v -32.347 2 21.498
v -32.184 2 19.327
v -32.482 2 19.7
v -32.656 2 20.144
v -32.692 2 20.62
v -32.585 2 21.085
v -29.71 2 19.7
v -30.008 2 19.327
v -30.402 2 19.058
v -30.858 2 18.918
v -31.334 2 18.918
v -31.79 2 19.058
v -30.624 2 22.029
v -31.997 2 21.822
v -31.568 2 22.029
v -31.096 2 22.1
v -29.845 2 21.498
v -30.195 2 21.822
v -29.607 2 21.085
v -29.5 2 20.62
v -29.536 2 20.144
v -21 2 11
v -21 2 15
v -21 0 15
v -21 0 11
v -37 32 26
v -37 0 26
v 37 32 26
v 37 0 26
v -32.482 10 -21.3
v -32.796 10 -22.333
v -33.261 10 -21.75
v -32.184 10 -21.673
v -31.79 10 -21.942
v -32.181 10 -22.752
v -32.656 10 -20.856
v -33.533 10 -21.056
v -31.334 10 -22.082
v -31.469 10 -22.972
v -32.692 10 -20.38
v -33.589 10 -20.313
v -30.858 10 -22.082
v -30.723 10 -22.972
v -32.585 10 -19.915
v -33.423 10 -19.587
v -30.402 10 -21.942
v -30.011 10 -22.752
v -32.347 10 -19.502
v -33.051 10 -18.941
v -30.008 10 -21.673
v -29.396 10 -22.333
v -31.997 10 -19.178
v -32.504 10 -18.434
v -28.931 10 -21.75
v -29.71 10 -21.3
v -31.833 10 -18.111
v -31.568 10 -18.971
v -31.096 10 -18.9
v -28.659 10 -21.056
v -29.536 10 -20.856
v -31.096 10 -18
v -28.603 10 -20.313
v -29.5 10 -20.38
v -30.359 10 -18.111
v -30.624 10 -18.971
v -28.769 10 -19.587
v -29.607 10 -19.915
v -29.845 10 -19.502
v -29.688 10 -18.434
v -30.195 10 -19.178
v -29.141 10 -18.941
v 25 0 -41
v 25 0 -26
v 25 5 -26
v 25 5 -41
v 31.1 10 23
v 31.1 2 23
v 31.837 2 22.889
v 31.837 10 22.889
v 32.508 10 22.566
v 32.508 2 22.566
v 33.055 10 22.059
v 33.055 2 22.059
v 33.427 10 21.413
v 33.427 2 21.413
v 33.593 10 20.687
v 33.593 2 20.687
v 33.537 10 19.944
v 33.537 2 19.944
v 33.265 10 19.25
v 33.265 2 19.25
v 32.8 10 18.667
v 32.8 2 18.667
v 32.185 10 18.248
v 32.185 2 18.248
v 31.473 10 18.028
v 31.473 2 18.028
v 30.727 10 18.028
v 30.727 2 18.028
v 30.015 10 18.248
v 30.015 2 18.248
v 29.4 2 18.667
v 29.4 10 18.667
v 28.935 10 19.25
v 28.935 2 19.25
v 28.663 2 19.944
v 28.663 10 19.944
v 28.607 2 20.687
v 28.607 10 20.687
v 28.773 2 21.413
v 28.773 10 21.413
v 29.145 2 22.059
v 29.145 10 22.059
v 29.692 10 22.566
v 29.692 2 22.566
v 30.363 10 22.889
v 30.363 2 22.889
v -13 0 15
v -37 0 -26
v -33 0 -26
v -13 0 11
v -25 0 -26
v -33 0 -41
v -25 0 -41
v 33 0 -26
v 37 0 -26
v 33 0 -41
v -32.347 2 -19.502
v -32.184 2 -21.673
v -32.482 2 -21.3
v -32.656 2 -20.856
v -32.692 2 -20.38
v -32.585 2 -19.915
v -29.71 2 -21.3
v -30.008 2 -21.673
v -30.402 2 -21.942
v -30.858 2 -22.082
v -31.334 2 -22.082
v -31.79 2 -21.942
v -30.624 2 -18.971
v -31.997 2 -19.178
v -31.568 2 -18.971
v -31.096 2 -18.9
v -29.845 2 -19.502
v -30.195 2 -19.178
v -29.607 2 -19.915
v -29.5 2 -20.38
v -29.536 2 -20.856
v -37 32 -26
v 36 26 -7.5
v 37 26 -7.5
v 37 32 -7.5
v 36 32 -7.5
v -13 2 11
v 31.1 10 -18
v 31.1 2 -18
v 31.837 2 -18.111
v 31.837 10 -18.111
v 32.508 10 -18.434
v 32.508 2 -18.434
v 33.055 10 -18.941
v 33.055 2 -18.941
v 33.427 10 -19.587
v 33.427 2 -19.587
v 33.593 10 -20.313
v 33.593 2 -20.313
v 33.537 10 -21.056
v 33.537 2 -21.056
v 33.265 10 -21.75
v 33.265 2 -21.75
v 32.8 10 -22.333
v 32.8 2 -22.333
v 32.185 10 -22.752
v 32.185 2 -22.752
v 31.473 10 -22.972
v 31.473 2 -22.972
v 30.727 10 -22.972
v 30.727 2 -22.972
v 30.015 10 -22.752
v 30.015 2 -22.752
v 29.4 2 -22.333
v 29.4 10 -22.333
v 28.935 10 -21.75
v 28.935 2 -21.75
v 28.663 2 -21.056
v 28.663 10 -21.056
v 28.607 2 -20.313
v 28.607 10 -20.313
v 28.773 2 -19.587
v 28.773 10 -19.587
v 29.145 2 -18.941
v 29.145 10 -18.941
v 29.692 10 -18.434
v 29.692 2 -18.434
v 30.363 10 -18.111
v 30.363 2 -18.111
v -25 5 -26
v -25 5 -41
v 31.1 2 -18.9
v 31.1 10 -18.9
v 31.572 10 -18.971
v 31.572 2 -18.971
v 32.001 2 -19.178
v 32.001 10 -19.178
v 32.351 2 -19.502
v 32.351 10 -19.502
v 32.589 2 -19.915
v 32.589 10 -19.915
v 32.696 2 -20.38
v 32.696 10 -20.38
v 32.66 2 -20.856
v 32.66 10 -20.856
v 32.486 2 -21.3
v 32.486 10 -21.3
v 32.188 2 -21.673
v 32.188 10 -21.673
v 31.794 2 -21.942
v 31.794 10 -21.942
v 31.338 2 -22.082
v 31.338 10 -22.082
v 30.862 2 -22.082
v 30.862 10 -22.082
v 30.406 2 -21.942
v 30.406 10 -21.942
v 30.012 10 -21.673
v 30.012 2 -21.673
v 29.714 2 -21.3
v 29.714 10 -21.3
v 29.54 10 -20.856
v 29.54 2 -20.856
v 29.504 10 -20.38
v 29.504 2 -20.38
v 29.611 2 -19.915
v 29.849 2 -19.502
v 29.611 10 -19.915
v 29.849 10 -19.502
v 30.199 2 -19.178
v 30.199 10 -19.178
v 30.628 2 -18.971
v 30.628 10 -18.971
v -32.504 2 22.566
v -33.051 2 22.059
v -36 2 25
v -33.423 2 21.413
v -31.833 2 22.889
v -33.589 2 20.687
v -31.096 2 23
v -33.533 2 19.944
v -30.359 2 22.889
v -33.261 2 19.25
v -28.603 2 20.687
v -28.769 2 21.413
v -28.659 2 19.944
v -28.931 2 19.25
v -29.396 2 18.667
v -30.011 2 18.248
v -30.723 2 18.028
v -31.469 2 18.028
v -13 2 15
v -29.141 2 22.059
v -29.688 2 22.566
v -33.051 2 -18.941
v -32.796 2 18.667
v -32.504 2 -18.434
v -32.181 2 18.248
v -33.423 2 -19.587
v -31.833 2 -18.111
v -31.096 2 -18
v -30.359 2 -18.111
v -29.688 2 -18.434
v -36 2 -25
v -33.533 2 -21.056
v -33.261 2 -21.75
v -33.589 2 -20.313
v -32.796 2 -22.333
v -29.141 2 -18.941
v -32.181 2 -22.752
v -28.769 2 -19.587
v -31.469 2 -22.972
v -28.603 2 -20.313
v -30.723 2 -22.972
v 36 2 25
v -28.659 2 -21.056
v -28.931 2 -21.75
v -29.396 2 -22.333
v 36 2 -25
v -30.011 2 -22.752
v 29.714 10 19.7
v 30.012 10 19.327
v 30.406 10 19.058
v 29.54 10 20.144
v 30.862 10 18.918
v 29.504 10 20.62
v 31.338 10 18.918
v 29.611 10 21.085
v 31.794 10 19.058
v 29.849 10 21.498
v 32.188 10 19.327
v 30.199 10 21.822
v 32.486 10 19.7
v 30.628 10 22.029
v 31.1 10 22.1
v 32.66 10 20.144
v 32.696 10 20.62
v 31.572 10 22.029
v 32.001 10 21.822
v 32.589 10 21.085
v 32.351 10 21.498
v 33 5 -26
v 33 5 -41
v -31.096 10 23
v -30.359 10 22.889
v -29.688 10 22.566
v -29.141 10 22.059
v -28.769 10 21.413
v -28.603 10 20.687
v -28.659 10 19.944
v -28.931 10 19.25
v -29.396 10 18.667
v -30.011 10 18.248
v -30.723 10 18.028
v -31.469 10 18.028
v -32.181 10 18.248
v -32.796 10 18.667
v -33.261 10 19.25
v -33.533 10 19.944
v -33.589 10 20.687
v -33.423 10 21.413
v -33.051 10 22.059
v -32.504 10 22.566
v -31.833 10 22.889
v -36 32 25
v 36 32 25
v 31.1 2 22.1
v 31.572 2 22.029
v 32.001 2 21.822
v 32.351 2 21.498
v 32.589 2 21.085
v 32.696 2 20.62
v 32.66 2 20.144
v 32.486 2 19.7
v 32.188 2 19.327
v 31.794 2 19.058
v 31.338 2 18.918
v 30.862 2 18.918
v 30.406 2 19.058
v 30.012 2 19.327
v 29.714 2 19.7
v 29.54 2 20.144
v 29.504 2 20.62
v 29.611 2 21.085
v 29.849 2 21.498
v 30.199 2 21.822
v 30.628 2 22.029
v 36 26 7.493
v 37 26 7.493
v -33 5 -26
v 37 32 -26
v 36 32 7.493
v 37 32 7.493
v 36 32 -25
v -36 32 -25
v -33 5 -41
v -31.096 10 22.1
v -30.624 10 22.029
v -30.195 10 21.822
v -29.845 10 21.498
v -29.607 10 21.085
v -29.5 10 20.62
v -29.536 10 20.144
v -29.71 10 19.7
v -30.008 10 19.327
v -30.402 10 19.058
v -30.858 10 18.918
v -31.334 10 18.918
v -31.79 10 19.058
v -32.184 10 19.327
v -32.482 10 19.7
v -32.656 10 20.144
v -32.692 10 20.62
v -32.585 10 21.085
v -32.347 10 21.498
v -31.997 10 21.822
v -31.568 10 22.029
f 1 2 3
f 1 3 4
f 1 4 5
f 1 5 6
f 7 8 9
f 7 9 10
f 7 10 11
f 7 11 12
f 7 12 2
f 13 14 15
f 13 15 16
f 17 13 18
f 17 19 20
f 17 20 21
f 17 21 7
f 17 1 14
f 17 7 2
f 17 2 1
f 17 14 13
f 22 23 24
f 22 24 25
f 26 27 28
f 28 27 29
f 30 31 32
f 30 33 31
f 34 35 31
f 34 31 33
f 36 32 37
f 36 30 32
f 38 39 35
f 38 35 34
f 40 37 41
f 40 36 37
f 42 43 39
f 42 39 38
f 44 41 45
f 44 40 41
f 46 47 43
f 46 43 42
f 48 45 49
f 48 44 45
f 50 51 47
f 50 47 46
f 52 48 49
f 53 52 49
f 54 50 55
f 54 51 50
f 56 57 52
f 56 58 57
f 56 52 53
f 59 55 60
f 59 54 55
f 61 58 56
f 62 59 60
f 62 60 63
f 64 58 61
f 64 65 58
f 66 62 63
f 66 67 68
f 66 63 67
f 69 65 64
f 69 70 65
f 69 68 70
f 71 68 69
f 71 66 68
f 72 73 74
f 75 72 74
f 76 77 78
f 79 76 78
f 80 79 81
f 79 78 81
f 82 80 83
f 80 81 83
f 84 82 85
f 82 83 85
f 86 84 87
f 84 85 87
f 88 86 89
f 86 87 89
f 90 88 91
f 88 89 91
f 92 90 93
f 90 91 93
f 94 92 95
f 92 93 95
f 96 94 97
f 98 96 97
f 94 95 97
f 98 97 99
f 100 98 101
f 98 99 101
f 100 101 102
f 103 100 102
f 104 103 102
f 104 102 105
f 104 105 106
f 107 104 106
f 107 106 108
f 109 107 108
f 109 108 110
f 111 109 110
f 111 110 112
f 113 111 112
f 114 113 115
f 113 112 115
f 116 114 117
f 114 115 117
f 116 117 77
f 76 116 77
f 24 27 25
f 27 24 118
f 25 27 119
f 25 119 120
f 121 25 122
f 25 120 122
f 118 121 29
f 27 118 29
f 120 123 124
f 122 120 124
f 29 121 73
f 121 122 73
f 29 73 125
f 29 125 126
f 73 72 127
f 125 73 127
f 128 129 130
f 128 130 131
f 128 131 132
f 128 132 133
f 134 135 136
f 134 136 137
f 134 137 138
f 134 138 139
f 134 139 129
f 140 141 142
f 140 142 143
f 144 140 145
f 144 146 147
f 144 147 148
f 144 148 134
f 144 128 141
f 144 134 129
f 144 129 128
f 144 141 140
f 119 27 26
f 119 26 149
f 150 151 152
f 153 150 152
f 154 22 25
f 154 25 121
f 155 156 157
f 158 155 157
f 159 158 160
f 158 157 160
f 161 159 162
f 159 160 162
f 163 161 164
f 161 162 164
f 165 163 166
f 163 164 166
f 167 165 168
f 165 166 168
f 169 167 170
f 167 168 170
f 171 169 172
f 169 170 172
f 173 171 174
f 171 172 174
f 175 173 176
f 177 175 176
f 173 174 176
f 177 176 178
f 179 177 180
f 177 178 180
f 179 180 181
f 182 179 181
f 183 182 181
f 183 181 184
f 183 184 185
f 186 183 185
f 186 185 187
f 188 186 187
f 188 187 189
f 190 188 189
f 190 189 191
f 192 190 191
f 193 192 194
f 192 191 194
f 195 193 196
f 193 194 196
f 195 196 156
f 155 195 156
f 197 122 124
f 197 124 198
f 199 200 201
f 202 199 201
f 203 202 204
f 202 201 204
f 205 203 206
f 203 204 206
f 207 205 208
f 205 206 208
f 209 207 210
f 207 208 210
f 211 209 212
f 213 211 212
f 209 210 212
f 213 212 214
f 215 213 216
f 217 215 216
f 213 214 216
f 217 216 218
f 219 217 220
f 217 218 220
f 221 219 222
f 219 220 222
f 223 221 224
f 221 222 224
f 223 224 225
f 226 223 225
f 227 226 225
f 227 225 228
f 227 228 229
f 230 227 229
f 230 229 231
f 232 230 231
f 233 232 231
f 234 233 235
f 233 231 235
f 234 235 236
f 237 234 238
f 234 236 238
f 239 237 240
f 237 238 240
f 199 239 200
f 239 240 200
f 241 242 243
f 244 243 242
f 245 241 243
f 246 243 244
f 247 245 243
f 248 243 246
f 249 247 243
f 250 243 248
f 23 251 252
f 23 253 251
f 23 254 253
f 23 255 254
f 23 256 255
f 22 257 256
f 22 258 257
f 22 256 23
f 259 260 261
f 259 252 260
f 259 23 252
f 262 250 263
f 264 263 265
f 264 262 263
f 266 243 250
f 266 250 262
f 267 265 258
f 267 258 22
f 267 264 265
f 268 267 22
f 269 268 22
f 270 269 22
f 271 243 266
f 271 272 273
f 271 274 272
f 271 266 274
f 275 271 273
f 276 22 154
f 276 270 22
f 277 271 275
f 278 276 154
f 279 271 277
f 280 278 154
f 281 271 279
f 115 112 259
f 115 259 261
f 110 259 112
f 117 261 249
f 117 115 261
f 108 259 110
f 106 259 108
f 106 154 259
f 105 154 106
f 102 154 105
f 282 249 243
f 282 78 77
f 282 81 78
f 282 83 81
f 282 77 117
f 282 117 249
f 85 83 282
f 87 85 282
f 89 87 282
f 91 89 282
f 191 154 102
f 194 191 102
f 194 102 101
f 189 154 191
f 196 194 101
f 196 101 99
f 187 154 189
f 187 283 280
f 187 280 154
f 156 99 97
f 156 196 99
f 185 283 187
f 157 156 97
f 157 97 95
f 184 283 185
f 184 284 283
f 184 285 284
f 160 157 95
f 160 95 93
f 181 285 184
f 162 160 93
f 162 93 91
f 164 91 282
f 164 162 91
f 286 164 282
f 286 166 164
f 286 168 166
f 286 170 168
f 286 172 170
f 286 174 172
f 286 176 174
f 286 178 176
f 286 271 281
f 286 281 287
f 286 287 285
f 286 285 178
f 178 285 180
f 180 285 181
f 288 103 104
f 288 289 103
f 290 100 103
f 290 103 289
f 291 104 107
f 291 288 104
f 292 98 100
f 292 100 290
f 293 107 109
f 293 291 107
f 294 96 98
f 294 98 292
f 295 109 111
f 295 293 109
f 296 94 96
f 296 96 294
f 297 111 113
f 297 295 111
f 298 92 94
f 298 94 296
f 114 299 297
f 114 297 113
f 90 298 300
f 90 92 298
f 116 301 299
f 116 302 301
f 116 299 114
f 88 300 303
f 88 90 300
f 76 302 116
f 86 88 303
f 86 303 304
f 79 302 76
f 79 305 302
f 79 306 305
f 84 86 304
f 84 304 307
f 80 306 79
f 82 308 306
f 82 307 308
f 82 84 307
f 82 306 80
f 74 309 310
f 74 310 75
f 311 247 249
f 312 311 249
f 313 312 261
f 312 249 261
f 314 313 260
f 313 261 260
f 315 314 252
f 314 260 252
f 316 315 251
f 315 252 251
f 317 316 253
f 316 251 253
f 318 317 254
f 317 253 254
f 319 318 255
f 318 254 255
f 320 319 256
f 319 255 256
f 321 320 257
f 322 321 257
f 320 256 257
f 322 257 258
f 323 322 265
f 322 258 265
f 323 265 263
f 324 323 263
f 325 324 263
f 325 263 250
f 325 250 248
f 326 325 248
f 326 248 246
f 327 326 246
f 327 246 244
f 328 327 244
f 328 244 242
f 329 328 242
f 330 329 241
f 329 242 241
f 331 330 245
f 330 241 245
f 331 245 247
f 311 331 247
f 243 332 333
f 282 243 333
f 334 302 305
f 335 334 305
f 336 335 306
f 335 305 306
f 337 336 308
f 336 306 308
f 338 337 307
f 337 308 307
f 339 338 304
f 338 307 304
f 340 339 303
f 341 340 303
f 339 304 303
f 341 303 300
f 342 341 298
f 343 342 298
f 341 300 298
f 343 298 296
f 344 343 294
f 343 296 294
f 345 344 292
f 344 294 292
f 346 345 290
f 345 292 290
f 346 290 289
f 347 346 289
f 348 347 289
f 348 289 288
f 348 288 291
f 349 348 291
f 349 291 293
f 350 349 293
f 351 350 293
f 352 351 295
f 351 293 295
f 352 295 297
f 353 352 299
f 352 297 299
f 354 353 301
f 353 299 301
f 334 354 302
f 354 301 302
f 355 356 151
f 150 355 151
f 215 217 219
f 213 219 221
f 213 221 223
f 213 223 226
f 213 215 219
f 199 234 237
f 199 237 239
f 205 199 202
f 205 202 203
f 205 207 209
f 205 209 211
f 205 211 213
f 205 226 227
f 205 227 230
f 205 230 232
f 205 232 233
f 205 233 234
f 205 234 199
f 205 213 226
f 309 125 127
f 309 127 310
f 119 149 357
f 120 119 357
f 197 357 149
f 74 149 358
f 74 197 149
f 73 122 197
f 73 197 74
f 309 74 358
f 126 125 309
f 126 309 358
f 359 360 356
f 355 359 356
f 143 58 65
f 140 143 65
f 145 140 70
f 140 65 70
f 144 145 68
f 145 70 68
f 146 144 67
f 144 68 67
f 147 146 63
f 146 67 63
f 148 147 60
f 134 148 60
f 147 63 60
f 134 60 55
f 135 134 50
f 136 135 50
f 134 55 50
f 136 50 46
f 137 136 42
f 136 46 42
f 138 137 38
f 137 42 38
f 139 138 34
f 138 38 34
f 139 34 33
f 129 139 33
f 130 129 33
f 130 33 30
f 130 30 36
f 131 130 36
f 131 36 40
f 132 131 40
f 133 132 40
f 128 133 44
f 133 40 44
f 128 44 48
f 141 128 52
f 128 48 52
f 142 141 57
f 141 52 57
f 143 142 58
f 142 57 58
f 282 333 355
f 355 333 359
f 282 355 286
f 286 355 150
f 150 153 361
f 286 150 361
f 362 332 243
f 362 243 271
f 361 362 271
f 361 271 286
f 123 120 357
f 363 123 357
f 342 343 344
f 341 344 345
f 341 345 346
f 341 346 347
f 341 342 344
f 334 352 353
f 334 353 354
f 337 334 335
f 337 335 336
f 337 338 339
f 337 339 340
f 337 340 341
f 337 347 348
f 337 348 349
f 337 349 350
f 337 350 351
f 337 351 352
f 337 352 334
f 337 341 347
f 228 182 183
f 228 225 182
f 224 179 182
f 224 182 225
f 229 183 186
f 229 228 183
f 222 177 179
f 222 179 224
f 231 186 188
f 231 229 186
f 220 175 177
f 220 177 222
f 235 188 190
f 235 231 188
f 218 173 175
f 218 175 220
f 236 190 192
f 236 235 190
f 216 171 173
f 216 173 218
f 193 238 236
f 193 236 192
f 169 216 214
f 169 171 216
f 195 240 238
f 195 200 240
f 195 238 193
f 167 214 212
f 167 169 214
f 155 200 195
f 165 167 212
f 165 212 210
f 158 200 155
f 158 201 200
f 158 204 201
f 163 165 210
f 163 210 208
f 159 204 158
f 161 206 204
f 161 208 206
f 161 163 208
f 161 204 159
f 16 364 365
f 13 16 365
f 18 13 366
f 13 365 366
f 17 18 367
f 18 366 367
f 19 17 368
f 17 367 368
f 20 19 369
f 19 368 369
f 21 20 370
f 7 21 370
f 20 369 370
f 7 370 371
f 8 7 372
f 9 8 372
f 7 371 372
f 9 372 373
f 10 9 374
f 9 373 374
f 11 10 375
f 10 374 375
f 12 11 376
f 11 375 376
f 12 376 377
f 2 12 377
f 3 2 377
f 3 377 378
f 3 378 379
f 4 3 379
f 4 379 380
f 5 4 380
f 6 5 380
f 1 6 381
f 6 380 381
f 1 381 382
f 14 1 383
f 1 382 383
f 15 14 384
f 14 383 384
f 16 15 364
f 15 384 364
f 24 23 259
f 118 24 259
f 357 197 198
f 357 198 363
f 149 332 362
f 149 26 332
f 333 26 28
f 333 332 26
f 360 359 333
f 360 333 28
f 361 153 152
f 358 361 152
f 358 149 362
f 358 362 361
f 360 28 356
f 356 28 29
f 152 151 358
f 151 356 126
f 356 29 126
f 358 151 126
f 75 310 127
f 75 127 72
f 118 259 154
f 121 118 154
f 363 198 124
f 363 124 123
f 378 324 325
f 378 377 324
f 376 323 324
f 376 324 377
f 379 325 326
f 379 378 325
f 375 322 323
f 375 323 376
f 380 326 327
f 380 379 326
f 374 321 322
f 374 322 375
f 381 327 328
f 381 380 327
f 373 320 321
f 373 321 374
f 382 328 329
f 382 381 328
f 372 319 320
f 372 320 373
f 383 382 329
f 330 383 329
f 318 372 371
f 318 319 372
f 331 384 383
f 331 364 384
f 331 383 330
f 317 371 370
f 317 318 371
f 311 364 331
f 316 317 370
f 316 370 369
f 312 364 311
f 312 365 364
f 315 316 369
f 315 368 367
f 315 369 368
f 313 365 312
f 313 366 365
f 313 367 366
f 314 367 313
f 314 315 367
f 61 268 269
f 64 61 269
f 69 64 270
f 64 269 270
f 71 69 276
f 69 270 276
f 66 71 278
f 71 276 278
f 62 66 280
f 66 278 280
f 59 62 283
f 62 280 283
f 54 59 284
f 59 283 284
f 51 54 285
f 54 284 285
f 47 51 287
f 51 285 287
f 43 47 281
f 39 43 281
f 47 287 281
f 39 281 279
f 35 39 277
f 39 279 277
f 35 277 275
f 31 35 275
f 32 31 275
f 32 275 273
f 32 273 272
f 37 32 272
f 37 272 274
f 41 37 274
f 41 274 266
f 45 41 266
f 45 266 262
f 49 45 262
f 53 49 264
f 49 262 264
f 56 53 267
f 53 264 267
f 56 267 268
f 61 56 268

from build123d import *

# Parameters (mm, degrees)
ENCLOSURE_SHELL_SKETCH_W      = 74
ENCLOSURE_SHELL_SKETCH_H      = 52
ENCLOSURE_SHELL_FEATURE_DEPTH = 32
ENCLOSURE_GAP_SKETCH_W        = 72
ENCLOSURE_GAP_SKETCH_H        = 50
ENCLOSURE_GAP_FEATURE_DEPTH   = 30
SCREW_SHELL_SKETCH_R          = 2.5
SCREW_SHELL_FEATURE_DEPTH     = 8
SCREW_HOLE_SKETCH_R           = 1.6
SCREW_HOLE_FEATURE_DEPTH      = 8
BATTERY_CUT_REACH             = 86.711
BATTERY_CUT_DIRECTION_2_DEPTH = 85.711274338
CAMERA_CORD_HOLE_SKETCH_W     = 8
CAMERA_CORD_HOLE_SKETCH_H     = 4
CAMERA_CORD_HOLE_DEPTH        = 55.267854205
TAB_FEATURE_SKETCH_W          = 8
TAB_FEATURE_SKETCH_H          = 5
TAB_FEATURE_DEPTH             = 15


with BuildPart() as part:
    # Enclosure Shell Sketch → Enclosure Shell Feature (new body)
    with BuildSketch(Plane(origin=(0, 0, 0), x_dir=(1, 0, 0), z_dir=(0, 1, 0))):
        Rectangle(ENCLOSURE_SHELL_SKETCH_W, ENCLOSURE_SHELL_SKETCH_H)
    extrude(amount=ENCLOSURE_SHELL_FEATURE_DEPTH)

    # Enclosure Gap Sketch → Enclosure Gap Feature (cut)
    with BuildSketch(Plane(origin=(0, 32, 0), x_dir=(1, 0, 0), z_dir=(0, 1, 0))):
        Rectangle(ENCLOSURE_GAP_SKETCH_W, ENCLOSURE_GAP_SKETCH_H)
    extrude(amount=-ENCLOSURE_GAP_FEATURE_DEPTH, mode=Mode.SUBTRACT)

    # Screw Shell Sketch → Screw Shell Feature (add)
    with BuildSketch(Plane(origin=(0, 2, 0), x_dir=(1, 0, 0), z_dir=(0, 1, 0))):
        with Locations(Location((-31.096, 20.5, 0), (0, 0, 270))):
            Circle(SCREW_SHELL_SKETCH_R)
        with Locations(Location((-31.096, -20.5, 0), (0, 0, 270))):
            Circle(SCREW_SHELL_SKETCH_R)
        with Locations(Location((31.1, 20.5, 0), (0, 0, 270))):
            Circle(SCREW_SHELL_SKETCH_R)
        with Locations(Location((31.1, -20.5, 0), (0, 0, 270))):
            Circle(SCREW_SHELL_SKETCH_R)
    extrude(amount=SCREW_SHELL_FEATURE_DEPTH)

    # Screw Hole Sketch → Screw Hole Feature (cut)
    with BuildSketch(Plane(origin=(0, 10, 0), x_dir=(1, 0, 0), z_dir=(0, 1, 0))):
        with Locations(Location((-31.096, 20.5, 0), (0, 0, 270))):
            Circle(SCREW_HOLE_SKETCH_R)
        with Locations(Location((-31.096, -20.5, 0), (0, 0, 270))):
            Circle(SCREW_HOLE_SKETCH_R)
        with Locations(Location((31.1, -20.5, 0), (0, 0, 270))):
            Circle(SCREW_HOLE_SKETCH_R)
        with Locations(Location((31.1, 20.5, 0), (0, 0, 270))):
            Circle(SCREW_HOLE_SKETCH_R)
    extrude(amount=-SCREW_HOLE_FEATURE_DEPTH, mode=Mode.SUBTRACT)

    # Battery Cut Sketch → Battery Cut (cut, up to next)
    with BuildSketch(Plane.ZY.offset(-37), mode=Mode.PRIVATE) as battery_cut_sk1:
        Polygon((0, 32), (7.492527579, 32), (7.492527579, 26), (-7.5, 26), (-7.5, 32), align=None)
    battery_cut_tool1 = extrude(battery_cut_sk1.sketch, amount=BATTERY_CUT_REACH, mode=Mode.PRIVATE) & part.part
    add(battery_cut_tool1.solids().sort_by_distance((37, 29, -0.003736))[0], mode=Mode.SUBTRACT)

    # Battery Cut Sketch → Battery Cut direction 2 (cut)
    with BuildSketch(Plane.ZY.offset(-37)):
        Polygon((0, 32), (7.492527579, 32), (7.492527579, 26), (-7.5, 26), (-7.5, 32), align=None)
    extrude(amount=-BATTERY_CUT_DIRECTION_2_DEPTH, mode=Mode.SUBTRACT)

    # Camera Cord Hole Sketch → Camera Cord Hole (cut, through all)
    with BuildSketch(Plane(origin=(0, 2, 0), x_dir=(1, 0, 0), z_dir=(0, 1, 0))):
        with Locations((-17, -13)):
            Rectangle(CAMERA_CORD_HOLE_SKETCH_W, CAMERA_CORD_HOLE_SKETCH_H)
    extrude(amount=-CAMERA_CORD_HOLE_DEPTH, mode=Mode.SUBTRACT)

    # Tab Feature Sketch → Tab Feature (add)
    with BuildSketch(Plane(origin=(0, 0, -26), x_dir=(-1, 0, 0), z_dir=(0, 0, -1))):
        with Locations((-29, 2.5)):
            Rectangle(TAB_FEATURE_SKETCH_W, TAB_FEATURE_SKETCH_H)
        with Locations((29, 2.5)):
            Rectangle(TAB_FEATURE_SKETCH_W, TAB_FEATURE_SKETCH_H)
    extrude(amount=TAB_FEATURE_DEPTH)


solid = part.part
